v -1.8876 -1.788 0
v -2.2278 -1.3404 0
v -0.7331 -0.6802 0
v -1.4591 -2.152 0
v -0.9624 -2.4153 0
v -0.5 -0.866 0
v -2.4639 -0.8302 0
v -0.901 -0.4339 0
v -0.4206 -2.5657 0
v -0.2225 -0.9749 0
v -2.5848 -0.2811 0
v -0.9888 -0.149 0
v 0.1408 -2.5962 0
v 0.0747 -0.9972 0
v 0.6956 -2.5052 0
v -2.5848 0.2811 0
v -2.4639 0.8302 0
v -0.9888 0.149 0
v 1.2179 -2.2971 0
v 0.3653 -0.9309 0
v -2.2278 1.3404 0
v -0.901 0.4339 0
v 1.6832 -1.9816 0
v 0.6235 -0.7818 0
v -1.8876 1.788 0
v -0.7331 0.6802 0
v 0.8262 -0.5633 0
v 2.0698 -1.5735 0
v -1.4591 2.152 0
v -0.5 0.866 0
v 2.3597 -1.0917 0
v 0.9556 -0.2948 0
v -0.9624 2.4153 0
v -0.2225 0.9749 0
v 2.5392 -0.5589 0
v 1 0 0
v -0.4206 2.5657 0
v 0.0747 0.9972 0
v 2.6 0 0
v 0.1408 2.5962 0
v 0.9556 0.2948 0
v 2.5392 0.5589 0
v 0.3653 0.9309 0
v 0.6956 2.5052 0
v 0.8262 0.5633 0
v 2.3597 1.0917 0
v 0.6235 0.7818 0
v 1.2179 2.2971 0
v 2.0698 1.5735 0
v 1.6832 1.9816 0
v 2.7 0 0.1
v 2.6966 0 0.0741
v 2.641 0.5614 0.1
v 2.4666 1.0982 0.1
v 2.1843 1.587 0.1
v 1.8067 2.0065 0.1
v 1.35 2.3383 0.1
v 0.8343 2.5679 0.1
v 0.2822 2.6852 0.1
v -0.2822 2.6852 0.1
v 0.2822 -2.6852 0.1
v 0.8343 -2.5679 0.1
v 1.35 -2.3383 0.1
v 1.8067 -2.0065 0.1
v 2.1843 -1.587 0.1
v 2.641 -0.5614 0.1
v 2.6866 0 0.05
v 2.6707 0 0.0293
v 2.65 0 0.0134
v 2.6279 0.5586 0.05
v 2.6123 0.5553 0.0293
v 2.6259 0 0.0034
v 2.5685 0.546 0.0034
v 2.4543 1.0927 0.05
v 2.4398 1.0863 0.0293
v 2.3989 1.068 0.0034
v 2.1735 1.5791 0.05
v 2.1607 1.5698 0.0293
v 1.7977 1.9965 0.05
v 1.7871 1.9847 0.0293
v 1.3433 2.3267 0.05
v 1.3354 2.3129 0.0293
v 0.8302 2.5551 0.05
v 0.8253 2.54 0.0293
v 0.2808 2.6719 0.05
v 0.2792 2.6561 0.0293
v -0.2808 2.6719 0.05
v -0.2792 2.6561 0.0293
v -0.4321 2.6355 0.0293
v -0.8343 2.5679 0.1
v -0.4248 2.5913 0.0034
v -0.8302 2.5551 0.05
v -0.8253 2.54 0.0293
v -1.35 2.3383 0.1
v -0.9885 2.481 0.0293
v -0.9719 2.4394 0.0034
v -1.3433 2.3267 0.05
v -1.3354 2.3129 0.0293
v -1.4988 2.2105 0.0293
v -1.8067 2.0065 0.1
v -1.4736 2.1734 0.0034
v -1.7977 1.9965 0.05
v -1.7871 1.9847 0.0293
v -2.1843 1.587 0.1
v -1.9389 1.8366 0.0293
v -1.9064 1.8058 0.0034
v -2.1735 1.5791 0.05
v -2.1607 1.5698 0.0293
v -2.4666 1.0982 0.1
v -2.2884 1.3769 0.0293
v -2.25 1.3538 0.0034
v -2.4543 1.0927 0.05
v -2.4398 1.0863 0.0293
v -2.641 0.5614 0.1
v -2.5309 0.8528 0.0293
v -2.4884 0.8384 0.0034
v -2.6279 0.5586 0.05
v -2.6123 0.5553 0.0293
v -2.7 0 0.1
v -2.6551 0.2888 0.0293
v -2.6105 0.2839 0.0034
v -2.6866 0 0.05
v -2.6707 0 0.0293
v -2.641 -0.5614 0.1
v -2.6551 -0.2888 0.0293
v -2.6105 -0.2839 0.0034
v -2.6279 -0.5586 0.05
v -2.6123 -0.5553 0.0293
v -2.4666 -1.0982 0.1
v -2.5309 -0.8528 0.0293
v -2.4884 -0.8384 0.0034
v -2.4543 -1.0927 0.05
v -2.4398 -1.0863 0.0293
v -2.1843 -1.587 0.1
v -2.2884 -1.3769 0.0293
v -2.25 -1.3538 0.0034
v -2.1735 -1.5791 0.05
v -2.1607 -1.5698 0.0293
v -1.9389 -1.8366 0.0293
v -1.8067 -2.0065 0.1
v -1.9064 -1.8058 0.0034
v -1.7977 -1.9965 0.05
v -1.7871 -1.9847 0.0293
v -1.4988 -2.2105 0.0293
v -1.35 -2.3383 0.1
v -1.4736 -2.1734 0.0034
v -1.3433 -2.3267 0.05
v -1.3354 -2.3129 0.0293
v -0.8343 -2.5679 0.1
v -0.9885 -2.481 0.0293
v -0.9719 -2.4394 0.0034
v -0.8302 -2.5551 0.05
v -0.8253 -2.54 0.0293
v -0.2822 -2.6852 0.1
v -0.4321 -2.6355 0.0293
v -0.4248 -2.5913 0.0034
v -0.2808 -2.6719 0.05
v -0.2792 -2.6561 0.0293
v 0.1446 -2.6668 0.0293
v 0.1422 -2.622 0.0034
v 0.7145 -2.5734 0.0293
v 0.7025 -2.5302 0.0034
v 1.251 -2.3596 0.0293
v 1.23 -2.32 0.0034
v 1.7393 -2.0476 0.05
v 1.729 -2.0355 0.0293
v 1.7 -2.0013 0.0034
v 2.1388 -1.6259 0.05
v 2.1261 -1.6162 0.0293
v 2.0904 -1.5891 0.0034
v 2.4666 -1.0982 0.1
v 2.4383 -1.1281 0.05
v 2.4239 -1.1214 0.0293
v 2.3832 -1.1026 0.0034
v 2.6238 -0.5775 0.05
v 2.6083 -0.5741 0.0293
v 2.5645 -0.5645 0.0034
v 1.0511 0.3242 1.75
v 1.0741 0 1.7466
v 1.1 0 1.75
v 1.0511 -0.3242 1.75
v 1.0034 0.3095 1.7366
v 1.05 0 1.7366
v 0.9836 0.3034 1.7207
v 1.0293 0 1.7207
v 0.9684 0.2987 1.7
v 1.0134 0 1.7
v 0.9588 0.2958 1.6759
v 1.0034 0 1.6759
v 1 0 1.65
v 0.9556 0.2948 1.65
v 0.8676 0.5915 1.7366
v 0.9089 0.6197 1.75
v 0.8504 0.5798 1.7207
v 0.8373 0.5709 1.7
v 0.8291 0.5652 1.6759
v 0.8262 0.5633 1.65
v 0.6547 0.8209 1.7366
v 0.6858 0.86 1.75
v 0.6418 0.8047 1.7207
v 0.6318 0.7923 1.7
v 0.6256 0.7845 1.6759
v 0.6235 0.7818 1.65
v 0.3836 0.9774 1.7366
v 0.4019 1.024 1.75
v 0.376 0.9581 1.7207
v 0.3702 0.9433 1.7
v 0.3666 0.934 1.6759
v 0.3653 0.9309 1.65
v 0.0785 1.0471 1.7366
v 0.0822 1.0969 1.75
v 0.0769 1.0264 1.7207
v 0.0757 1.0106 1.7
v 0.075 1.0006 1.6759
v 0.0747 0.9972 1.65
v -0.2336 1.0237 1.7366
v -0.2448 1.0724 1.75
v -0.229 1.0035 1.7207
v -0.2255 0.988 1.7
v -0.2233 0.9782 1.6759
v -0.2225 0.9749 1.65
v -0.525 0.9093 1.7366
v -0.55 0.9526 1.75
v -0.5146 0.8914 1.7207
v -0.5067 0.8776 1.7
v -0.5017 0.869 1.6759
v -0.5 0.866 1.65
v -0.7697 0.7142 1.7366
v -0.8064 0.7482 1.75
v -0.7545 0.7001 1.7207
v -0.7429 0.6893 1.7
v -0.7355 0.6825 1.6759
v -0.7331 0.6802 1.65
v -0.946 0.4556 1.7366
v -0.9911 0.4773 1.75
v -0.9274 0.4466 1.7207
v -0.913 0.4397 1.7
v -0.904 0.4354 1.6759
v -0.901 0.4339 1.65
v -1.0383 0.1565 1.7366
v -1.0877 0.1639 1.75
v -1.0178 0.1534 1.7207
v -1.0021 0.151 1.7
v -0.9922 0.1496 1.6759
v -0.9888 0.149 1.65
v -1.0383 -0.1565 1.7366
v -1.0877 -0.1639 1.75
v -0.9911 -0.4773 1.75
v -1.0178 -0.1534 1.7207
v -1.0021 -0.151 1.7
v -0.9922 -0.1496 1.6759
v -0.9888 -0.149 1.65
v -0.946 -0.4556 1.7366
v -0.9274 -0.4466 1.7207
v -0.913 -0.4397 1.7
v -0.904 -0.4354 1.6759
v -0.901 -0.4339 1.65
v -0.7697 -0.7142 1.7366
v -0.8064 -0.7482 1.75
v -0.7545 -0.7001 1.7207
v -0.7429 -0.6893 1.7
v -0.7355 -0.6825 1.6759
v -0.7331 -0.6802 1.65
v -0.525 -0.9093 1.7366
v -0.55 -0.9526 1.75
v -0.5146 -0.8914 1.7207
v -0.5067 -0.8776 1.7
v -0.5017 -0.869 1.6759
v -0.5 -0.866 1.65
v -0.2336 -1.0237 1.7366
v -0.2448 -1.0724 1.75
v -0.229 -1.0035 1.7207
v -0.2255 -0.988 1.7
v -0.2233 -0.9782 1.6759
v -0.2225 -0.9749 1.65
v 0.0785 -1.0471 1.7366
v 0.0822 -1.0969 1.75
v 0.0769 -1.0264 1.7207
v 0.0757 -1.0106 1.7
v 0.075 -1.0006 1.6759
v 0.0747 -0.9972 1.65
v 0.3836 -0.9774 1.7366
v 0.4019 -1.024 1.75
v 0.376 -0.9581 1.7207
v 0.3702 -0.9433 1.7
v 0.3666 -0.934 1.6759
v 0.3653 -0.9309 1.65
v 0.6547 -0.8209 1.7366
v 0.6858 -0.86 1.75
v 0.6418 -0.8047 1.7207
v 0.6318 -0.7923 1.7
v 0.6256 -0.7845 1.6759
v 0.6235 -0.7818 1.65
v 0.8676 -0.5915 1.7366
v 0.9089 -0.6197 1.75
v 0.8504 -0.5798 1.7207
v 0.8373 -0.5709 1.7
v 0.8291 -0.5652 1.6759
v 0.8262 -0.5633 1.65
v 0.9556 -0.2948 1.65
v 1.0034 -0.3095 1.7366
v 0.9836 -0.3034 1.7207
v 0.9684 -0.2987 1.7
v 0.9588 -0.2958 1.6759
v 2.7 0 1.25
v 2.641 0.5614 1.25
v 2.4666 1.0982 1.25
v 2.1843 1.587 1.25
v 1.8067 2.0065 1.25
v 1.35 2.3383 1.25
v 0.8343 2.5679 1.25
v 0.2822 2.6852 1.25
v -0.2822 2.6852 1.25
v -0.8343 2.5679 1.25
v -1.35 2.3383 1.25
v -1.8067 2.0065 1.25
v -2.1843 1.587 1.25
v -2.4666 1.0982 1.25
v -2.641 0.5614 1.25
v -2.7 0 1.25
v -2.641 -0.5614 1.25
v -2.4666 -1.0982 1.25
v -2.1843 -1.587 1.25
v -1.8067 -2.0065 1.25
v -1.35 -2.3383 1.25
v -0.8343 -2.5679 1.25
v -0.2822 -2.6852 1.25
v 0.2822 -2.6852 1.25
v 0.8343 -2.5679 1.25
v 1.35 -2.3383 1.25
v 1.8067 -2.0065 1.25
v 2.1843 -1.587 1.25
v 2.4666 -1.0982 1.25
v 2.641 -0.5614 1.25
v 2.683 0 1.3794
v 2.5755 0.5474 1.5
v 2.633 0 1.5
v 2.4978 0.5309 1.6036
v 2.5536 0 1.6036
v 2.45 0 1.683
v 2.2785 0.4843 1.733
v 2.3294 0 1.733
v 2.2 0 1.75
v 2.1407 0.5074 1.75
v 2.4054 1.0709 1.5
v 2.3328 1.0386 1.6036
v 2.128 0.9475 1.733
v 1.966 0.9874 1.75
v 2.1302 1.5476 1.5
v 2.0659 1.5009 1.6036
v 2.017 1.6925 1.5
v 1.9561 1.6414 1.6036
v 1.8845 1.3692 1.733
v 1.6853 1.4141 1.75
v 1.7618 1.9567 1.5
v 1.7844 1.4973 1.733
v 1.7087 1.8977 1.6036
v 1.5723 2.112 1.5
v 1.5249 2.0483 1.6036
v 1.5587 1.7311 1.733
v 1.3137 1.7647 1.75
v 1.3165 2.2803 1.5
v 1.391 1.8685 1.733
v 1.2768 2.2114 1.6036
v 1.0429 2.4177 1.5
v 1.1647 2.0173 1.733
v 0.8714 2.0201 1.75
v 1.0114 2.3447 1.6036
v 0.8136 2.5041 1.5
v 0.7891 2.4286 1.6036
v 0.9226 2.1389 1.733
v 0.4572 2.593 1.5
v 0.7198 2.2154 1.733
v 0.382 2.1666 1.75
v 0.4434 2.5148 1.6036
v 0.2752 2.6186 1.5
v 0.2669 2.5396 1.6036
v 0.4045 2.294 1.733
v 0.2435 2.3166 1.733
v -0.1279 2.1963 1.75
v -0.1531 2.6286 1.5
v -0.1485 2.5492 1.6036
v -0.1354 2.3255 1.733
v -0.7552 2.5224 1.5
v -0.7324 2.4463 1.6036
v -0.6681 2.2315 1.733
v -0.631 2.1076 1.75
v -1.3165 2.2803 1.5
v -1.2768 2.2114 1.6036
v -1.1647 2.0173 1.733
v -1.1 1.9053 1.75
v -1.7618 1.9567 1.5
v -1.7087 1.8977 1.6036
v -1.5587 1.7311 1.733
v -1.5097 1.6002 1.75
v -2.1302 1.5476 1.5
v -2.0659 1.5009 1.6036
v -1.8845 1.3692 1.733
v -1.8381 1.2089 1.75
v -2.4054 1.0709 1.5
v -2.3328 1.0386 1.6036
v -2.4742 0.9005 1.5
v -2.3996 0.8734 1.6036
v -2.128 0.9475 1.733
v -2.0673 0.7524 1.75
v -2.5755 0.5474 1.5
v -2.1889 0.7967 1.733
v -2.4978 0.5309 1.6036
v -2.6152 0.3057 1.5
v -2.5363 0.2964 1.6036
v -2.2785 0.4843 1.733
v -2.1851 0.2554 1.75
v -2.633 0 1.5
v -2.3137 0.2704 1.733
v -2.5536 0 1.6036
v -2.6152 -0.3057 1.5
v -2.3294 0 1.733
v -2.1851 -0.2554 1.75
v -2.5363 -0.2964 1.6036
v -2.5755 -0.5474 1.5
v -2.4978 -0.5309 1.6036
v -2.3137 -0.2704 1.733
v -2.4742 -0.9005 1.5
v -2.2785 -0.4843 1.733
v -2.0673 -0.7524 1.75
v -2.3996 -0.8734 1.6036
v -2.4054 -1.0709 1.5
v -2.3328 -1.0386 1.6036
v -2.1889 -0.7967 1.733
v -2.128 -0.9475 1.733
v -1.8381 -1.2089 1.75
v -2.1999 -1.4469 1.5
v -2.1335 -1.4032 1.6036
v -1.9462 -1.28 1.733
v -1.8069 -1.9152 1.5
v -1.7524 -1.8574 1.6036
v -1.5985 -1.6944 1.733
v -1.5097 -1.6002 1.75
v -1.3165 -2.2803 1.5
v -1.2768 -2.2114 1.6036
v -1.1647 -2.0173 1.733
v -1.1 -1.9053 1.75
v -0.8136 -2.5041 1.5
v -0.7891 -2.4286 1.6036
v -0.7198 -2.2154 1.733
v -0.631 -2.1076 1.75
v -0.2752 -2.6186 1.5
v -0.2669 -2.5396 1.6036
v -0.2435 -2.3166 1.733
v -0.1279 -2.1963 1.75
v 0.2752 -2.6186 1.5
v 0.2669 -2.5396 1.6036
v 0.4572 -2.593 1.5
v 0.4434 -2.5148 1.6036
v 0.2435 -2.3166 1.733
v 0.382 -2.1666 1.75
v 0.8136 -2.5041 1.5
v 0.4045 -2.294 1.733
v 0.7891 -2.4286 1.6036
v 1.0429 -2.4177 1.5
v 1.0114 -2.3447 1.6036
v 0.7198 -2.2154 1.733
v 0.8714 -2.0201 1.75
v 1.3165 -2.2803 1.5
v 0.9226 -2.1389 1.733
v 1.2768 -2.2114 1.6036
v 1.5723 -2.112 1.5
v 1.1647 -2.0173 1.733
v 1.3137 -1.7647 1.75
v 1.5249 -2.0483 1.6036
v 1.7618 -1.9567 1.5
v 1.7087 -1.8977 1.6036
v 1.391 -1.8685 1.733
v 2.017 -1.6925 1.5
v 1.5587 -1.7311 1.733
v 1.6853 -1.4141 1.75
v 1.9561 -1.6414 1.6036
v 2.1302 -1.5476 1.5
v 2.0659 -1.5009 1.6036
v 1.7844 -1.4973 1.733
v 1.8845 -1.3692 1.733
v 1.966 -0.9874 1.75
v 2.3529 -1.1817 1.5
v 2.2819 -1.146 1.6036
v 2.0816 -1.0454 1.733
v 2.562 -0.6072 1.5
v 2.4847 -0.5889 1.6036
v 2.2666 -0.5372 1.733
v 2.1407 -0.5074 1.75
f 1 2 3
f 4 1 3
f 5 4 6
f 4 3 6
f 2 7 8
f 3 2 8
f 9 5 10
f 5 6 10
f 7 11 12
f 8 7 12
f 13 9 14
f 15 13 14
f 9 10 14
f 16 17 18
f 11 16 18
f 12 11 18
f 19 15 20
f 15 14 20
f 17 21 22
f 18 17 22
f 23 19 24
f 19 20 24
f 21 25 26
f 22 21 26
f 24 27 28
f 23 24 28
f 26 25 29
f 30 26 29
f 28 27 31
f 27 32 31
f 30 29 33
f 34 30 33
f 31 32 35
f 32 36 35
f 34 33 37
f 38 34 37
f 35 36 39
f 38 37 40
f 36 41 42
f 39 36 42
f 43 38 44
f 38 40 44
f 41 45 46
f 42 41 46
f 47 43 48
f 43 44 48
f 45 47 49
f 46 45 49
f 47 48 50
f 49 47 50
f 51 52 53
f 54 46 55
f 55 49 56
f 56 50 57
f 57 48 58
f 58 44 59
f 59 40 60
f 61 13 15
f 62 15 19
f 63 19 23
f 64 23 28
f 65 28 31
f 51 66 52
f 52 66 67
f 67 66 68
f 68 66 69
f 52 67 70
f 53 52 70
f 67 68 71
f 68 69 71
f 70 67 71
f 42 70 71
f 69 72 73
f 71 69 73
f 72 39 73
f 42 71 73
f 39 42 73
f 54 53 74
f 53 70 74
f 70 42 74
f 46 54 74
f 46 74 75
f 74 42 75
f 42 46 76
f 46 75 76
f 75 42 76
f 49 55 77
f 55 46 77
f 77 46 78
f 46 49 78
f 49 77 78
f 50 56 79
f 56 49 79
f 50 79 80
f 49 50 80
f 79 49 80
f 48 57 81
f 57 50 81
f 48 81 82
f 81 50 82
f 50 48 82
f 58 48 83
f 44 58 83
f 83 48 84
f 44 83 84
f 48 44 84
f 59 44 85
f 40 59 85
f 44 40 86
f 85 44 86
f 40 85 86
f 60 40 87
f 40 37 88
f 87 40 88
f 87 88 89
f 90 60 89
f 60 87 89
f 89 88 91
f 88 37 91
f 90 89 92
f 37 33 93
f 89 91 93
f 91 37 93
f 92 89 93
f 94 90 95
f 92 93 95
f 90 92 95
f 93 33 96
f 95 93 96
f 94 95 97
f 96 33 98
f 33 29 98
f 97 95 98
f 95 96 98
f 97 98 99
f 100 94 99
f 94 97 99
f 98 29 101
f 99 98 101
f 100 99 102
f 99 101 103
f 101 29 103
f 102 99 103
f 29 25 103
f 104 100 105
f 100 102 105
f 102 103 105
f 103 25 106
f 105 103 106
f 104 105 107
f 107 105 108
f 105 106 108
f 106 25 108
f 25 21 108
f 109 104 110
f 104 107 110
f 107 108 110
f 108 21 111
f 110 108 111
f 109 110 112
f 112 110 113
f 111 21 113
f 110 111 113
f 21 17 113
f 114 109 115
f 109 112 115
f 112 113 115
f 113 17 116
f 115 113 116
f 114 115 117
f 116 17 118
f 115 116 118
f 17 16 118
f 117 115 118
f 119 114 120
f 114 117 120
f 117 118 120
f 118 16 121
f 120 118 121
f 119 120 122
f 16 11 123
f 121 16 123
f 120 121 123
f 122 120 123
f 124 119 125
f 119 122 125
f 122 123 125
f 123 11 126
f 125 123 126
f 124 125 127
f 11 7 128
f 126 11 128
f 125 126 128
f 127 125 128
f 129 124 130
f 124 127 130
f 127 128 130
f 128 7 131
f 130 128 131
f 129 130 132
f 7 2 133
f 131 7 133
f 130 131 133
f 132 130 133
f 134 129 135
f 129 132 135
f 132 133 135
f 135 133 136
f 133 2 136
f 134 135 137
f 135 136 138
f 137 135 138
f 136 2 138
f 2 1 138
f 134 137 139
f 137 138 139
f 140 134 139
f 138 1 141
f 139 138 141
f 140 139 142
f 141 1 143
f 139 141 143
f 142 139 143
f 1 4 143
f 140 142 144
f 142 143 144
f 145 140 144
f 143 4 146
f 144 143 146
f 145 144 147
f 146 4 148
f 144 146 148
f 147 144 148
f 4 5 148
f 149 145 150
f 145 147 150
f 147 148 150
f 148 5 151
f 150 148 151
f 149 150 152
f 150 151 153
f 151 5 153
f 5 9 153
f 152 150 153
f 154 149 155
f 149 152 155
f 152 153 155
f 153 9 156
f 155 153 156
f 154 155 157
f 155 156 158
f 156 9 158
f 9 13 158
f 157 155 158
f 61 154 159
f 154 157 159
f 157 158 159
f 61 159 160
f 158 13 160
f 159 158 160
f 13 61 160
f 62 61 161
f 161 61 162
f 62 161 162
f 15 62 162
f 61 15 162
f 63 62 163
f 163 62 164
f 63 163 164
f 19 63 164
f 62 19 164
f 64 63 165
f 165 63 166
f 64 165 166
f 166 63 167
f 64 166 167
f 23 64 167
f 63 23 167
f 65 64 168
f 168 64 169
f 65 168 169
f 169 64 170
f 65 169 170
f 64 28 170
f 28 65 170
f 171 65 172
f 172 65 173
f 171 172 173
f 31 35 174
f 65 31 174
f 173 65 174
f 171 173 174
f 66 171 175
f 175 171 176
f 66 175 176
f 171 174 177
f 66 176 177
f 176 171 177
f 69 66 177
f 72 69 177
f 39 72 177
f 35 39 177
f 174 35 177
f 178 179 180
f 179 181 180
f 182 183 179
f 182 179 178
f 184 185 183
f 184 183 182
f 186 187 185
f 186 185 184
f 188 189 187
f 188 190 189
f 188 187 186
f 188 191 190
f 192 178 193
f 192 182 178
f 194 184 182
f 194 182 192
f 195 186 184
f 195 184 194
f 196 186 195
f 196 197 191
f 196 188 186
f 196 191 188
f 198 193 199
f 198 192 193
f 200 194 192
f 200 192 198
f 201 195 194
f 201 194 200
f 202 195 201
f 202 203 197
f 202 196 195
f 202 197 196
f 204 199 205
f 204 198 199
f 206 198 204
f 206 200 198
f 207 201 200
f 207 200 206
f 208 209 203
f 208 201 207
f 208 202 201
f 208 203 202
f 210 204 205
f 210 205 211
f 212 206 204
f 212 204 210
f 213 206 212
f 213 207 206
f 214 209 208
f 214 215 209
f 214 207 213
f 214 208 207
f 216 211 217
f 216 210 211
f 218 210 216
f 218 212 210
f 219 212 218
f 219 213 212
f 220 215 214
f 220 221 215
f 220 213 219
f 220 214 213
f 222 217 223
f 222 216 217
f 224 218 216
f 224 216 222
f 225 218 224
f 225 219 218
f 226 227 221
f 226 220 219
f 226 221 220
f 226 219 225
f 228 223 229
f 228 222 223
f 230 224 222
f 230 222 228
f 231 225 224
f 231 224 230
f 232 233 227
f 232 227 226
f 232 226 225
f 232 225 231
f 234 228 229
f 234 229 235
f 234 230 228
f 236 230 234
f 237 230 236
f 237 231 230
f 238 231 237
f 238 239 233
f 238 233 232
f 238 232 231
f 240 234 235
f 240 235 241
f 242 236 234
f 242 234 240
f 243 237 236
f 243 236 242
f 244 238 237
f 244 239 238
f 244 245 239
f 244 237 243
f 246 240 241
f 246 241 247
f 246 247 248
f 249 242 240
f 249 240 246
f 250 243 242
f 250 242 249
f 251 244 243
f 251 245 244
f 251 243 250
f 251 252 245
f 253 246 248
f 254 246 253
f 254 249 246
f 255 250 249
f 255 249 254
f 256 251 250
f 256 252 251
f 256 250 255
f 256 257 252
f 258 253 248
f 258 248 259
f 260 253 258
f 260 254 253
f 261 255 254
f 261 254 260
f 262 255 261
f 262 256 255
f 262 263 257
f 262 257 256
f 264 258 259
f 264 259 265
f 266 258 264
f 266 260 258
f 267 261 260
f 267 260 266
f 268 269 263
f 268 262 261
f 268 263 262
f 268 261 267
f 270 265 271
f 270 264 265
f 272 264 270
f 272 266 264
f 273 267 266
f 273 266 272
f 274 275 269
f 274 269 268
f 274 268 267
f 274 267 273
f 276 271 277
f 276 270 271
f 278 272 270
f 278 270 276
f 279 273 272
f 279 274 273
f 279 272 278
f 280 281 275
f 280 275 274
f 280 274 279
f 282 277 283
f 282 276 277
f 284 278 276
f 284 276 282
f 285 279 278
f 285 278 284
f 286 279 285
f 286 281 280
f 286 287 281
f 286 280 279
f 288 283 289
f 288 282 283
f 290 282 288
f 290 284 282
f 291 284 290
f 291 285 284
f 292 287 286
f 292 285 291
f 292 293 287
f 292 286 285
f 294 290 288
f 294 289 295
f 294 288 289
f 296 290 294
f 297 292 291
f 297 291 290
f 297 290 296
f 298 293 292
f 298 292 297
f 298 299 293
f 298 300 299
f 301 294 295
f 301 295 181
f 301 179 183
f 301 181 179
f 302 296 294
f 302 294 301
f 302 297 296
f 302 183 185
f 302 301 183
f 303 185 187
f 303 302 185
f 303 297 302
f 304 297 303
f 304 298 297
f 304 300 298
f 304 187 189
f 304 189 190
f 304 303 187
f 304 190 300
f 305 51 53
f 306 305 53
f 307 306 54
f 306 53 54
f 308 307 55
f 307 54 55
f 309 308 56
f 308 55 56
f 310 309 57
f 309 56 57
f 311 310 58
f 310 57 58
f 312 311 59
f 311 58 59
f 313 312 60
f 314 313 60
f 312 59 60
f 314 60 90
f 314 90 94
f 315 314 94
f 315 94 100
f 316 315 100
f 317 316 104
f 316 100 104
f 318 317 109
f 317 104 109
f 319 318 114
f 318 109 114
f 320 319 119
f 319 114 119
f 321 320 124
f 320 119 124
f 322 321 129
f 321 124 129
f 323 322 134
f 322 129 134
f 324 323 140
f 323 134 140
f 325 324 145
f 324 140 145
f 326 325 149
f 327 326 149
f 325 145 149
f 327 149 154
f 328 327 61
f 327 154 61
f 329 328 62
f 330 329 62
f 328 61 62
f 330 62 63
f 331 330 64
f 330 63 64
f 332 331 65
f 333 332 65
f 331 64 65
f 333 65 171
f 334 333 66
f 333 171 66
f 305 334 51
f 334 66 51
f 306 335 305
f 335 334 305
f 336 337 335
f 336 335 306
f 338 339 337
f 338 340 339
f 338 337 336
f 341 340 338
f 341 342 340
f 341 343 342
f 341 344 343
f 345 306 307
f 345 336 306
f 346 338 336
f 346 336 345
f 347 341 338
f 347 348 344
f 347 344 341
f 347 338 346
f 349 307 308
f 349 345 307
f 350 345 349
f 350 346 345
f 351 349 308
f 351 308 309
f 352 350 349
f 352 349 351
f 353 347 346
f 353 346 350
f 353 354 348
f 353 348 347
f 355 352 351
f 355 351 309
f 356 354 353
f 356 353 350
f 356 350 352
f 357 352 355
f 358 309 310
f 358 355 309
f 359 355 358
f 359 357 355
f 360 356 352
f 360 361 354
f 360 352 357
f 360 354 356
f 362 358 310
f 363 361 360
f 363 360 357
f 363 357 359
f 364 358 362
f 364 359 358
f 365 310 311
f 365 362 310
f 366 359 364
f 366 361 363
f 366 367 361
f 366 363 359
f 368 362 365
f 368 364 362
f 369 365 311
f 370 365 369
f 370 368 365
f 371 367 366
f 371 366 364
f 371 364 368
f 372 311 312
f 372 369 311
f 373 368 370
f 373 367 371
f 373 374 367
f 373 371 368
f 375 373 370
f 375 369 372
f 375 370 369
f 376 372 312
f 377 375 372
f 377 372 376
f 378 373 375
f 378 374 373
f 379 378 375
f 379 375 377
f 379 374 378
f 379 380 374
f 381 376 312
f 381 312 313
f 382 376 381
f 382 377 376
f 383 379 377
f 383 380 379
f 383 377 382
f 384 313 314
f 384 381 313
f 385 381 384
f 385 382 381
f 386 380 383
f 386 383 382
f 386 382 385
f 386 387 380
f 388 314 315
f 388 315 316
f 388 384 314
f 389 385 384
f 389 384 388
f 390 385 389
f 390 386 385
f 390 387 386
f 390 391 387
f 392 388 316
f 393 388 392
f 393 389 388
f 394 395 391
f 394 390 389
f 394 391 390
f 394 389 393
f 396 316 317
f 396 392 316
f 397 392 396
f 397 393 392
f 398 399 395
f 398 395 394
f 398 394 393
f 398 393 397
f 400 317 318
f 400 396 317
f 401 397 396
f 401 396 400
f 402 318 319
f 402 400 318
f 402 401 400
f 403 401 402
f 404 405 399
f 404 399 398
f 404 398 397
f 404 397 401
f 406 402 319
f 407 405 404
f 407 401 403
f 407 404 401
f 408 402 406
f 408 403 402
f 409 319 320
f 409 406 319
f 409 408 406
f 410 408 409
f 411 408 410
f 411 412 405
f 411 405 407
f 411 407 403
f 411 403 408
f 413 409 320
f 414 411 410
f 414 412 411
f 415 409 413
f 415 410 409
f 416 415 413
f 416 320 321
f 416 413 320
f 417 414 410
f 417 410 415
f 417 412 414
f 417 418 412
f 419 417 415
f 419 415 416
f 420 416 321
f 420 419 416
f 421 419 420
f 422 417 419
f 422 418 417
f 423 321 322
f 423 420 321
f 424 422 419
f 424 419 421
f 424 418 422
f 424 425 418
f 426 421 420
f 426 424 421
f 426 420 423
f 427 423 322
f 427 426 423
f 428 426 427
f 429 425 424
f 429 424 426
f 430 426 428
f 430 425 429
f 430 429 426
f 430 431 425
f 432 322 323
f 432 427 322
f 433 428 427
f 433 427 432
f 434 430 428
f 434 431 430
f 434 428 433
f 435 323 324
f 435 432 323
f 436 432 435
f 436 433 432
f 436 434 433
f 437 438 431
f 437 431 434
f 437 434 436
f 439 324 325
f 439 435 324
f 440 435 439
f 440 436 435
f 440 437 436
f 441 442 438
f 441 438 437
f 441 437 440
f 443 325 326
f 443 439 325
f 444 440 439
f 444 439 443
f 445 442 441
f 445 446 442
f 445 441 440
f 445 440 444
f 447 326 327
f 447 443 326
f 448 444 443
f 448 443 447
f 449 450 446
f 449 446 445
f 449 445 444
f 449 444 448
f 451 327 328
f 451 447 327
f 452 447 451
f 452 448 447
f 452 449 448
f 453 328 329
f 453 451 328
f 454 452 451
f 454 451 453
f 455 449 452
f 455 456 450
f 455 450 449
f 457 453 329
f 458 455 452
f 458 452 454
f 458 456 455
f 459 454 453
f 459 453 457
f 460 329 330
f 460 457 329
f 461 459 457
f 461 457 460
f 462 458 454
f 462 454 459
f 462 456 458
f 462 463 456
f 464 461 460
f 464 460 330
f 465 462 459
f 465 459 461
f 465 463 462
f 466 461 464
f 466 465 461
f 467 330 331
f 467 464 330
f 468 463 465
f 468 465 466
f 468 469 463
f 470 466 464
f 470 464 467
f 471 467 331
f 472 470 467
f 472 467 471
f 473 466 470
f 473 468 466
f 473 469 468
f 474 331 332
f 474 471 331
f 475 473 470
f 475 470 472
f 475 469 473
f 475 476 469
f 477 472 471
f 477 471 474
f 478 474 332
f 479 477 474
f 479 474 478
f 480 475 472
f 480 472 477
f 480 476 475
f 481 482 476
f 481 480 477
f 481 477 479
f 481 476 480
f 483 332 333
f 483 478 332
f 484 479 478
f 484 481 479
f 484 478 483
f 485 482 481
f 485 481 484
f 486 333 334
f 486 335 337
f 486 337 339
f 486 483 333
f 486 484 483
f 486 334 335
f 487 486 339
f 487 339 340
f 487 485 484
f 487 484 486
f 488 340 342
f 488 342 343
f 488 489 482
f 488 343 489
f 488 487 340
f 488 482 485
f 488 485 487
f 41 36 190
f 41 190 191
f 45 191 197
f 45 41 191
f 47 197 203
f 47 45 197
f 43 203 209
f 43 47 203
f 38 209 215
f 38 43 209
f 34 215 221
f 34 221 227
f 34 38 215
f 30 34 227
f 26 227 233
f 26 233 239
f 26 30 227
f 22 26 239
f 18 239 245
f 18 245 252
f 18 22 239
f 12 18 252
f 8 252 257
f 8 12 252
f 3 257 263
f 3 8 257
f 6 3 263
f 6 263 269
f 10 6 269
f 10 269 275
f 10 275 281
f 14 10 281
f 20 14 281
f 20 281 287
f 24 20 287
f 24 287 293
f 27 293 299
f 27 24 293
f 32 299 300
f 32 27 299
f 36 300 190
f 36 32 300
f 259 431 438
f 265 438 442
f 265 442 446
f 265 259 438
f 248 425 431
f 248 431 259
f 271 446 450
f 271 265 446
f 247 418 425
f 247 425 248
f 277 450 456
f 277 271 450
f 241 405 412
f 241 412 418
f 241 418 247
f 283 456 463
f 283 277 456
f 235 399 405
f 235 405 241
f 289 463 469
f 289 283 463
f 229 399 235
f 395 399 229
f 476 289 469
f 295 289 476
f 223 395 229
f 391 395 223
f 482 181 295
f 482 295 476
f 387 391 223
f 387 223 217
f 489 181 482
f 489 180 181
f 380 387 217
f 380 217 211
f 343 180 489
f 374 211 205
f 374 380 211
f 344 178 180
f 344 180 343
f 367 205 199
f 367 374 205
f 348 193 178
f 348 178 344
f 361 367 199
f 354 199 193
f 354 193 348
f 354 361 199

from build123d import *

# Parameters (mm, degrees)
SKETCH1_R           = 2.7
SKETCH1_R_2         = 1
EXTRUDE_THIN1_DEPTH = 1.75
FILLET1_R           = 0.5
FILLET2_R           = 0.1


with BuildPart() as part:
    # Sketch1 → Extrude-Thin1 (new body)
    with BuildSketch(Plane.XY):
        Circle(SKETCH1_R)
        Circle(SKETCH1_R_2, mode=Mode.SUBTRACT)
    extrude(amount=EXTRUDE_THIN1_DEPTH)

    # Fillet1
    fillet1_edges = [part.edges().sort_by_distance(p)[0] for p in [
        (-2.7, 0, 1.75),
    ]]
    fillet(fillet1_edges, radius=FILLET1_R)

    # Fillet2
    fillet2_edges = [part.edges().sort_by_distance(p)[0] for p in [
        (-2.7, 0, 0),
        (-1, 0, 1.75),
    ]]
    fillet(fillet2_edges, radius=FILLET2_R)


solid = part.part
